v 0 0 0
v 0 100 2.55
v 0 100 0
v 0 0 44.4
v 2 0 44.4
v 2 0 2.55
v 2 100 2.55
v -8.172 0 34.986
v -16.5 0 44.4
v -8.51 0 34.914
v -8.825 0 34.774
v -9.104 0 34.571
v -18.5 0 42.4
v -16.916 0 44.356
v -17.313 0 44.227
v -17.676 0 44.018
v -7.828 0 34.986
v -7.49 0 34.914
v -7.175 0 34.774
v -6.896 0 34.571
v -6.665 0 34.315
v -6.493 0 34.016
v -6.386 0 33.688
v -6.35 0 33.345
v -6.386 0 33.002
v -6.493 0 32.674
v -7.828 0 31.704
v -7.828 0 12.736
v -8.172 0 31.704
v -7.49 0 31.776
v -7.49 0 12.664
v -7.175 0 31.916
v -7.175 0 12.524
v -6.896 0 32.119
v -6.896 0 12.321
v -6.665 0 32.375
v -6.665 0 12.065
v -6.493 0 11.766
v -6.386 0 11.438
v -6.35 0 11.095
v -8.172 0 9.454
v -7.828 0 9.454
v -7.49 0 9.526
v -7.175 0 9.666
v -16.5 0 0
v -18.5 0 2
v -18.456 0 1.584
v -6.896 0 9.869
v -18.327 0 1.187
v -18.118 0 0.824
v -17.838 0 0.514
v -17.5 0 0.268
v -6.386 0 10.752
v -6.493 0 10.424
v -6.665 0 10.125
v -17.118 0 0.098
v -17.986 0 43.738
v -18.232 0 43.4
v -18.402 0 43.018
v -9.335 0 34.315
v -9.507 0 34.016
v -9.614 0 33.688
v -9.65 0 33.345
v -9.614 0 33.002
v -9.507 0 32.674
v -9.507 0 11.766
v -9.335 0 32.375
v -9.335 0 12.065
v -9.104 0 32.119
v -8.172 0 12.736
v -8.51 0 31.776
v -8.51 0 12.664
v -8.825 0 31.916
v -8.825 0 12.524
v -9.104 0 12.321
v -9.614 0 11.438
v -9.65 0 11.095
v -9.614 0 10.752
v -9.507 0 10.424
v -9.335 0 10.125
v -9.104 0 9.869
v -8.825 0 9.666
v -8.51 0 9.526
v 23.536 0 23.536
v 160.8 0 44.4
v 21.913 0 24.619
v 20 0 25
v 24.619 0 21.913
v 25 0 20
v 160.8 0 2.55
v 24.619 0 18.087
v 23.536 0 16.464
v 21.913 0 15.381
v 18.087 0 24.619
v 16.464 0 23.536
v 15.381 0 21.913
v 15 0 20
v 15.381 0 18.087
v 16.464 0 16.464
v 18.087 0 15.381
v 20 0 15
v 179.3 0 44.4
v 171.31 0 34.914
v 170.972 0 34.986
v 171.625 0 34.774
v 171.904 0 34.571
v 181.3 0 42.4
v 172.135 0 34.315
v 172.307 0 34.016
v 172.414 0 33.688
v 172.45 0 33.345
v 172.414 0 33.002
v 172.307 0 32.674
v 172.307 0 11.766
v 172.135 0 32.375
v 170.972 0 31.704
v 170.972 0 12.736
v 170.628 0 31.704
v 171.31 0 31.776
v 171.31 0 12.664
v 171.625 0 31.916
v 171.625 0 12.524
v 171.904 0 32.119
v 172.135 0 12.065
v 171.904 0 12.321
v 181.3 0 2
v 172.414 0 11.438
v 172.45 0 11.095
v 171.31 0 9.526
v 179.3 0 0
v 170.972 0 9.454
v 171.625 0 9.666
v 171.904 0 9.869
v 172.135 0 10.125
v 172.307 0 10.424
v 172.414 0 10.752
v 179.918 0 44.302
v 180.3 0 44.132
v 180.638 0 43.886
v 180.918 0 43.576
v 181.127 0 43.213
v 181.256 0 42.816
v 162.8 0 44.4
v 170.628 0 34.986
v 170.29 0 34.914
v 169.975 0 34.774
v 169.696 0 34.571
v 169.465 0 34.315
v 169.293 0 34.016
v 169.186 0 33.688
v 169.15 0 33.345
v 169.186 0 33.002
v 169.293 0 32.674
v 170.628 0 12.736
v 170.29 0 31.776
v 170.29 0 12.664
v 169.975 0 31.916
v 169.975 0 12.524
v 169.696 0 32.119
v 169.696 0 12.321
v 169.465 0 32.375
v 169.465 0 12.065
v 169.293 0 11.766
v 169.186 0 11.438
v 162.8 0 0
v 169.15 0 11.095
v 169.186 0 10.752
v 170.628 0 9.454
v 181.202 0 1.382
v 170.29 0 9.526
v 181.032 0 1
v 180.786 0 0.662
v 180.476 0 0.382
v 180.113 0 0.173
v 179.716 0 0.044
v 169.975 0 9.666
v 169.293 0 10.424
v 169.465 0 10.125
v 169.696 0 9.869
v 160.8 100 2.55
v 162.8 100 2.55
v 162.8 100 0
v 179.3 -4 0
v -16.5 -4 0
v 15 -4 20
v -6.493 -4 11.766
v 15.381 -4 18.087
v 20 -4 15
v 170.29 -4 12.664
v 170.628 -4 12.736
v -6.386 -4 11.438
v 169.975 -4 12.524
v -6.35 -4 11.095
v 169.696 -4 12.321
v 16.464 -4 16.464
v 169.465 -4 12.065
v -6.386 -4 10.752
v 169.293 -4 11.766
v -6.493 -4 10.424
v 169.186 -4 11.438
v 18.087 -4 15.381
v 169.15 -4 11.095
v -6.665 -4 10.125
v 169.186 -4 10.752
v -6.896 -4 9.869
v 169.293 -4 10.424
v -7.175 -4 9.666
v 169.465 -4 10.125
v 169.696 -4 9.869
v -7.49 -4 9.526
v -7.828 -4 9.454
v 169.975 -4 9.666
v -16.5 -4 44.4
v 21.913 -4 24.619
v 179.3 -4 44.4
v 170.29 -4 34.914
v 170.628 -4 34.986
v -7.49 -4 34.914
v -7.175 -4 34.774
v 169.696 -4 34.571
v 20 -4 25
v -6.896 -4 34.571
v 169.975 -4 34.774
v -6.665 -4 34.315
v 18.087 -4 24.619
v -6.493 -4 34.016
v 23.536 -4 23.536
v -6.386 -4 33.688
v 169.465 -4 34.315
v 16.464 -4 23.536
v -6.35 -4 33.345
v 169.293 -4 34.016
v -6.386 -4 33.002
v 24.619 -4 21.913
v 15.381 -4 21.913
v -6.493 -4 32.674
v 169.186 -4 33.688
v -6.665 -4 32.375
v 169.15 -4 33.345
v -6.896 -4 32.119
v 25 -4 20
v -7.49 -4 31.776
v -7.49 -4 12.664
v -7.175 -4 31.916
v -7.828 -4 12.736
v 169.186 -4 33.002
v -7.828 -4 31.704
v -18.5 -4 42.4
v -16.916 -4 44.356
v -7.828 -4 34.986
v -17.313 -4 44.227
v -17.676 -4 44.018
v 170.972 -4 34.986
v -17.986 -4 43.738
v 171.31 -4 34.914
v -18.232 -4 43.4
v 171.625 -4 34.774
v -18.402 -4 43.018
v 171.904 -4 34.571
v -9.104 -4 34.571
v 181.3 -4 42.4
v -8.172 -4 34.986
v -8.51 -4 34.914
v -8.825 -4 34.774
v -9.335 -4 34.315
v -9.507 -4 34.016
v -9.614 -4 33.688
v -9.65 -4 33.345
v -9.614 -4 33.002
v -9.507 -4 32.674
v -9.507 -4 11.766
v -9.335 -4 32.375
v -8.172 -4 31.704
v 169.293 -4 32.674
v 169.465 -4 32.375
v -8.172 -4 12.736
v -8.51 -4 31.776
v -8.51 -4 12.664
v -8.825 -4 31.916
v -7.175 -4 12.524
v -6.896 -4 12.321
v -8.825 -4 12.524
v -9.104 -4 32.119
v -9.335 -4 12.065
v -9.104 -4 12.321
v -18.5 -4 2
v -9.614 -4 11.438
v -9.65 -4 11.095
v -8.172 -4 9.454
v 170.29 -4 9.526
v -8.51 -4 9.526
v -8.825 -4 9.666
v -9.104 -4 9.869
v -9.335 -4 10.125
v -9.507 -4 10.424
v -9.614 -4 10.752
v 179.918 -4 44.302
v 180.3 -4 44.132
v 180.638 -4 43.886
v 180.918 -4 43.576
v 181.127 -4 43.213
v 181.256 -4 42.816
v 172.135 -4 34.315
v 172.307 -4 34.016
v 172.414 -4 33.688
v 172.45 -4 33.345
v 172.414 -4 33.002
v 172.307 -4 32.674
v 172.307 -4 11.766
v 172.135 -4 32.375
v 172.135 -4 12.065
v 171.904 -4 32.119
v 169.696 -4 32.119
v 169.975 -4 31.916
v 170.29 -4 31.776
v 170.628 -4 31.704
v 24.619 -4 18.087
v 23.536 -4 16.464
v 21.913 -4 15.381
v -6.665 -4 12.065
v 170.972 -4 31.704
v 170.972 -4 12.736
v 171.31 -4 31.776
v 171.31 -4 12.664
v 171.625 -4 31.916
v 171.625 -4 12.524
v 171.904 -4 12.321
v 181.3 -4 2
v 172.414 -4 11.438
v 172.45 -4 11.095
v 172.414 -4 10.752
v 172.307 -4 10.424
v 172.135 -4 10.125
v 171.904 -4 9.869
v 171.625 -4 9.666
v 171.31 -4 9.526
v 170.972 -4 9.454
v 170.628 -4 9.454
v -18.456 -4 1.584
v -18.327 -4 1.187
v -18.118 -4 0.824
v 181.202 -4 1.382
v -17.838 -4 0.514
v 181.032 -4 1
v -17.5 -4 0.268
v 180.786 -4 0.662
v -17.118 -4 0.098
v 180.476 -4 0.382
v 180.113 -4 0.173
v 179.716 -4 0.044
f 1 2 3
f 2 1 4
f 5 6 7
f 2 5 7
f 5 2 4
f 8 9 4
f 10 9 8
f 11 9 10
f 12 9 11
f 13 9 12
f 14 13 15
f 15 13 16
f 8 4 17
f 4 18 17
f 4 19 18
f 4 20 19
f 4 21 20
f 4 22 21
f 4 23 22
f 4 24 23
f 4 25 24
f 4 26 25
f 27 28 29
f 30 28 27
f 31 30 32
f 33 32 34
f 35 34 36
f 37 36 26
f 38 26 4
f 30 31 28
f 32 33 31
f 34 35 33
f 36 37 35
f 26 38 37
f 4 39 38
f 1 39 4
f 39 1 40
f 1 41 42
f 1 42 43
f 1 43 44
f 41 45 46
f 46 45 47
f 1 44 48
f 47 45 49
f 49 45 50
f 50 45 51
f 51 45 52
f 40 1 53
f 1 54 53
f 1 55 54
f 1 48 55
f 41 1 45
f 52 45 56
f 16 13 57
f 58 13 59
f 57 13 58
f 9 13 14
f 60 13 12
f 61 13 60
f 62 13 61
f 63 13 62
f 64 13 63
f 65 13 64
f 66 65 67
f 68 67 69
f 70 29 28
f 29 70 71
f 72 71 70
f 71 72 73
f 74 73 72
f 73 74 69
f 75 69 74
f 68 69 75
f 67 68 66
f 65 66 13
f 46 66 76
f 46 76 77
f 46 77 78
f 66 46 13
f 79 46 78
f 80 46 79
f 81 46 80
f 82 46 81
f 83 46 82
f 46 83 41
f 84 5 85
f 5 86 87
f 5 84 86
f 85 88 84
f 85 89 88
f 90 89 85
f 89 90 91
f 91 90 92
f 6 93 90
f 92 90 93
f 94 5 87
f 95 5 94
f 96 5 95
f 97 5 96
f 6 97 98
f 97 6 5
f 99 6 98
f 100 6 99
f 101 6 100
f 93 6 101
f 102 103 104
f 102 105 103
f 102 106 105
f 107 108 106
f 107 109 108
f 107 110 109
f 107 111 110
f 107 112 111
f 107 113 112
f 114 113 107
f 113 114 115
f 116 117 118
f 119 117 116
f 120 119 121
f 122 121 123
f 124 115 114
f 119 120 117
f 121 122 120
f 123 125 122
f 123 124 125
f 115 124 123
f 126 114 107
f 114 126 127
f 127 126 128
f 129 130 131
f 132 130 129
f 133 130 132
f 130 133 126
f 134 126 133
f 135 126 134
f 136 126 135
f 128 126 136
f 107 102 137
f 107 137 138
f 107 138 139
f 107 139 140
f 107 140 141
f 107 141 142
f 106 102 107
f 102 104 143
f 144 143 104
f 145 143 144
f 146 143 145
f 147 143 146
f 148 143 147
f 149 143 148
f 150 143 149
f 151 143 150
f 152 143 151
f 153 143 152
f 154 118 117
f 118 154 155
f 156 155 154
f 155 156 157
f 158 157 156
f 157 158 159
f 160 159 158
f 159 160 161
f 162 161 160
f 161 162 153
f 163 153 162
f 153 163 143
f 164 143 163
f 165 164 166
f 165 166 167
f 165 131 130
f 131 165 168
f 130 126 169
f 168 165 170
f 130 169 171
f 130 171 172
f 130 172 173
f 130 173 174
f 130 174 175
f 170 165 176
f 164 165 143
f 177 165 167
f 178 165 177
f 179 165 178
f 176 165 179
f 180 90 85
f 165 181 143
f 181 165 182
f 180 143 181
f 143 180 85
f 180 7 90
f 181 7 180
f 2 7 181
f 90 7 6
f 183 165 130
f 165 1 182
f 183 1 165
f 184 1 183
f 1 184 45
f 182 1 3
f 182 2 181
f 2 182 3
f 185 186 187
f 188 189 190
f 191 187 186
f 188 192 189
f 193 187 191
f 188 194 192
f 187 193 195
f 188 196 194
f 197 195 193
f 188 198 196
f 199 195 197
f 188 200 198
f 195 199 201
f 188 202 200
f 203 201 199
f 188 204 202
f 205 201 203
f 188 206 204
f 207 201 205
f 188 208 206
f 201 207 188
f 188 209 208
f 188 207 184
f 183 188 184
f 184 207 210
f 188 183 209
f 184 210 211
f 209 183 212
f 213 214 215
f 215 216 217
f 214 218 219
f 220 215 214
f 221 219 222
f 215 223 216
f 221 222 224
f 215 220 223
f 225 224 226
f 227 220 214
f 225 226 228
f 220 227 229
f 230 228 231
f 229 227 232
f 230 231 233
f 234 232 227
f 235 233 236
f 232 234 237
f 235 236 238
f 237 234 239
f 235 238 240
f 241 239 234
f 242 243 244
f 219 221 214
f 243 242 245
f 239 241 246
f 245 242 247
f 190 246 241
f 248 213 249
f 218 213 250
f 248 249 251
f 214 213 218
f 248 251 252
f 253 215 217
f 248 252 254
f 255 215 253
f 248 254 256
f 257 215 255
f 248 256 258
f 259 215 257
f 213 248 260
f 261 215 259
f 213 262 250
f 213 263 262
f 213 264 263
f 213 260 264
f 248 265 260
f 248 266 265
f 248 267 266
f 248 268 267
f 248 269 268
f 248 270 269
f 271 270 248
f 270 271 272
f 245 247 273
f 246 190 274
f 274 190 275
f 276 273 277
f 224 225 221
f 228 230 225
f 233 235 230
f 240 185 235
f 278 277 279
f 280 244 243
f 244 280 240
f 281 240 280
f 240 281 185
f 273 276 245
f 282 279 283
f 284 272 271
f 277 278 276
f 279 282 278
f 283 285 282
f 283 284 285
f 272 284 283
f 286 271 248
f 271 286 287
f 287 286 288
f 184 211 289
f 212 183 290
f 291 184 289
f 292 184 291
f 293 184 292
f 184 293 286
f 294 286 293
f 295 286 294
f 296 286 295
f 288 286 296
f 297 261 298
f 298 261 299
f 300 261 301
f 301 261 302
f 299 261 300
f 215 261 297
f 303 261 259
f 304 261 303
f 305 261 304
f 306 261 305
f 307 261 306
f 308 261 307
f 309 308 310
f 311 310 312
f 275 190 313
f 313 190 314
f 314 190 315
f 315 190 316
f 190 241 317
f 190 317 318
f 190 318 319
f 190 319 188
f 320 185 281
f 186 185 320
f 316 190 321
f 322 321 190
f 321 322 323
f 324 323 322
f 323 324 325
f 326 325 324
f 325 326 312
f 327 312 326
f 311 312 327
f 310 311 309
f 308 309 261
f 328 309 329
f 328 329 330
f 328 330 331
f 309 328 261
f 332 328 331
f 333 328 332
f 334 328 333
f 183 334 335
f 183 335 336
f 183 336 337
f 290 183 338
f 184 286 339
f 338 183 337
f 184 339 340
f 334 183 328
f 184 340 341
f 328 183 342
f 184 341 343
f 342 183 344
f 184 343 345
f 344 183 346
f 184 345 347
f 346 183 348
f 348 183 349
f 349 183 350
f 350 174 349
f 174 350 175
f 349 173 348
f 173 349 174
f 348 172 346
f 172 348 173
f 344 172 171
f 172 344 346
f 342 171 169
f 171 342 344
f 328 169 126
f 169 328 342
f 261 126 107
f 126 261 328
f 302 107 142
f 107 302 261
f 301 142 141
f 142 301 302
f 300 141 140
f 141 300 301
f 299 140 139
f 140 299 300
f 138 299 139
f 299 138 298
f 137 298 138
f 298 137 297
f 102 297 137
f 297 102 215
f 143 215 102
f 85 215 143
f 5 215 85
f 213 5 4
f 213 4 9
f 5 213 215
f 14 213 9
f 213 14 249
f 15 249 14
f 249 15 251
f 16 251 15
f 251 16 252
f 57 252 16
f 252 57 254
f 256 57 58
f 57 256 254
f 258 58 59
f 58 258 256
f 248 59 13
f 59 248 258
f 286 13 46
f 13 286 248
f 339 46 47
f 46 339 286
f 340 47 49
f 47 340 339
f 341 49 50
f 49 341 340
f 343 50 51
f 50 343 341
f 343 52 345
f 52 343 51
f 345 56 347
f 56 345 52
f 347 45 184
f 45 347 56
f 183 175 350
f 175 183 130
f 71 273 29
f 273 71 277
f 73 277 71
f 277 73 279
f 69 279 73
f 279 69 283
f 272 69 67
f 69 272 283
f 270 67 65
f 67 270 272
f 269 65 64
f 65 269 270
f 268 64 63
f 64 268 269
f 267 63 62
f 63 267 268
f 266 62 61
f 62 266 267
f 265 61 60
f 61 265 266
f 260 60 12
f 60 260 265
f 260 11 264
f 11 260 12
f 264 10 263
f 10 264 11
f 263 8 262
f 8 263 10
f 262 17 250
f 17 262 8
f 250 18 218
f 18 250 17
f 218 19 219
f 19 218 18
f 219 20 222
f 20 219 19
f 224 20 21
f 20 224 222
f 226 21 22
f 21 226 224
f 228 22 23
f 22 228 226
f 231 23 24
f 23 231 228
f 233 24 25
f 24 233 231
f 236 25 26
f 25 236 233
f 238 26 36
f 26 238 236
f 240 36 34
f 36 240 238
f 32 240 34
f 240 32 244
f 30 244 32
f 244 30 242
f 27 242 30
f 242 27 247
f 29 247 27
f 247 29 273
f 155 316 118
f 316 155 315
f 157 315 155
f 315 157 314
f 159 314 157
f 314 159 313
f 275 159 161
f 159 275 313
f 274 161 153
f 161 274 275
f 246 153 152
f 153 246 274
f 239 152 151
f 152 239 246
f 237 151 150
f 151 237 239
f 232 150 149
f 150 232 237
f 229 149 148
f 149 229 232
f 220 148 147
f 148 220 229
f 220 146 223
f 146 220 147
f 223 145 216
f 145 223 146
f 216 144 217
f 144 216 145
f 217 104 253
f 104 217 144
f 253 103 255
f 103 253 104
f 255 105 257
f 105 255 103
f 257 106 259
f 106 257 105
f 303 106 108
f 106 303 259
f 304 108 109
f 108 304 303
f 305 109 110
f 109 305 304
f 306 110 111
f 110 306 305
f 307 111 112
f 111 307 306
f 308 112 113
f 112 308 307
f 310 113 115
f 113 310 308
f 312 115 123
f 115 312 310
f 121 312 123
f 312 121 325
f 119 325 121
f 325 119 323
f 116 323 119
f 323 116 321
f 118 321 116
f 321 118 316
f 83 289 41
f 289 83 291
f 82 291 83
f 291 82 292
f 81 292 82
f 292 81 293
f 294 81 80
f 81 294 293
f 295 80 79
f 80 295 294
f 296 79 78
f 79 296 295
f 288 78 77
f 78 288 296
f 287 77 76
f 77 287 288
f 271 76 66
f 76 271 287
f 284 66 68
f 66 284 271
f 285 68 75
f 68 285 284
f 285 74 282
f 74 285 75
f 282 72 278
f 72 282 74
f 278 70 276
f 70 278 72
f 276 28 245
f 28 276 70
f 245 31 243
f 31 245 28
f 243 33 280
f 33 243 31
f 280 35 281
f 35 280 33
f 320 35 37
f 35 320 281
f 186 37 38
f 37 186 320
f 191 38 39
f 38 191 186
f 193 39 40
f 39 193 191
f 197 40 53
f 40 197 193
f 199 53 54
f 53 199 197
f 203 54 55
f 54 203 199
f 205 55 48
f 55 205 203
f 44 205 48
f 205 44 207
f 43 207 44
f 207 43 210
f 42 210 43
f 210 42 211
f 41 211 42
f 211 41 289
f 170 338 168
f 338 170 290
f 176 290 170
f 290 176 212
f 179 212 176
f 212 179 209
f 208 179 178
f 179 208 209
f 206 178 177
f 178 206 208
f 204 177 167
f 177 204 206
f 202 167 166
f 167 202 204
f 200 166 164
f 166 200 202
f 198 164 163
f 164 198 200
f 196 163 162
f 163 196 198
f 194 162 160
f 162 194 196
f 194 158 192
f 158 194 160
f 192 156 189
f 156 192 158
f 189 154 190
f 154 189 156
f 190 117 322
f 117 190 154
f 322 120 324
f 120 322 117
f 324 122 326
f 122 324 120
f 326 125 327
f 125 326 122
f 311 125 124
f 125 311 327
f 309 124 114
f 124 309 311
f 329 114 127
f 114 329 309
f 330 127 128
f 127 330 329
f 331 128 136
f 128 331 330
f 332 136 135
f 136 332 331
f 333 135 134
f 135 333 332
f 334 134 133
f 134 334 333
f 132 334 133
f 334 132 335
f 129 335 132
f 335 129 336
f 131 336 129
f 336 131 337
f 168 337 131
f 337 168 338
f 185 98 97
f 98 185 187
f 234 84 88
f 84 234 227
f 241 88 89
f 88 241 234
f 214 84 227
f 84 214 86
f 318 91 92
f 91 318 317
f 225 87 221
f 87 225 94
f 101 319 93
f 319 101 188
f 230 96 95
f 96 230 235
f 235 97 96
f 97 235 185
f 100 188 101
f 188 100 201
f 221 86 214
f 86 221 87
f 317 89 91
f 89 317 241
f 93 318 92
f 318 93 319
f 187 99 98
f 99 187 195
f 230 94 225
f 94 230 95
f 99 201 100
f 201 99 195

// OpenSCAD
// file: microlab-2.scad
/* [Hidden] */
ML2_FRAME_THICKNESS = 4;
ML2_FRAME_RADIUS = 2;
ML2_FRAME_HEIGHT = 44.4;
ML2_FRAME_HEIGHT_GAP = 0.10;
ML2_FRAME_SIDE_WIDTH_INSIDE = 18.5;
ML2_FRAME_WIDTH_INSIDE = 162.8;
ML2_FRAME_HOLE_FROM_EDGE = 10.5;
ML2_FRAME_HOLE2_FROM_BOTTOM = 33.345;
ML2_FRAME_HOLE1_FROM_BOTTOM = 11.095;
ML2_FRAME_HOLE_DIA = 3.3;

function HeightFromNumberUnits(numberUnits) =
    numberUnits * ML2_FRAME_HEIGHT + (numberUnits-1) * ML2_FRAME_HEIGHT_GAP;

//FrontPlate(1, showRear=false, openFace=true, valign="left", halign="bottom") {
//    Shelf();
//}

module FrontPlate(numberUnits = 1, showRear=false, openFace=false, valign="bottom", halign="inside-left") {
    totalWidth = ML2_FRAME_WIDTH_INSIDE + 2 * ML2_FRAME_SIDE_WIDTH_INSIDE;
    height = HeightFromNumberUnits(numberUnits);
    
    x = halign == "center" ? totalWidth/2
        : halign == "inside-left" ? ML2_FRAME_SIDE_WIDTH_INSIDE
        : halign == "inside-right" ? totalWidth - ML2_FRAME_SIDE_WIDTH_INSIDE
        : 0;

    z = valign == "top" ? height
        : valign == "middle" ? height/2
        : 0;
    
    translate([-x,0,-z]) {
        rotate([90,0,0]) {
            linear_extrude(ML2_FRAME_THICKNESS)
                difference() {
                    // Front plate
                    if (openFace) {
                        union() {
                            w = ML2_FRAME_SIDE_WIDTH_INSIDE + 2;
                            // Left
                            offset(ML2_FRAME_RADIUS, $fn=30) offset(-ML2_FRAME_RADIUS)
                                square([w, height]);
                            translate([w- ML2_FRAME_RADIUS,0,0]) square([ML2_FRAME_RADIUS, height]);
                            // Right
                            translate([totalWidth - w,0,0]) {
                            offset(ML2_FRAME_RADIUS, $fn=30) offset(-ML2_FRAME_RADIUS)
                                square([w, height]);
                            square([ML2_FRAME_RADIUS, height]);
                            }
                        }
                    } else {
                        offset(ML2_FRAME_RADIUS, $fn=30) offset(-ML2_FRAME_RADIUS)
                            square([totalWidth, height]);
                    }
                    // Fixing holes
                    for (y = [0:numberUnits-1]) translate([0,y * (ML2_FRAME_HEIGHT + ML2_FRAME_HEIGHT_GAP),0]) {
                        translate([ML2_FRAME_HOLE_FROM_EDGE, ML2_FRAME_HOLE1_FROM_BOTTOM]) circle(d=ML2_FRAME_HOLE_DIA, $fn=30);
                        translate([ML2_FRAME_HOLE_FROM_EDGE, ML2_FRAME_HOLE2_FROM_BOTTOM]) circle(d=ML2_FRAME_HOLE_DIA, $fn=30);
                        translate([totalWidth-ML2_FRAME_HOLE_FROM_EDGE, ML2_FRAME_HOLE1_FROM_BOTTOM]) circle(d=ML2_FRAME_HOLE_DIA, $fn=30);
                        translate([totalWidth-ML2_FRAME_HOLE_FROM_EDGE, ML2_FRAME_HOLE2_FROM_BOTTOM]) circle(d=ML2_FRAME_HOLE_DIA, $fn=30);
                    }
                }
        }
        if (showRear) {
            %translate([ML2_FRAME_SIDE_WIDTH_INSIDE,0,0]) cube([ML2_FRAME_WIDTH_INSIDE, 100, height]);
        }
        children();
    }
}

module Shelf(numberUnits = 1, depth=100, shelfThickness=2.55, supportThickness=2) {
    height = HeightFromNumberUnits(numberUnits);
    translate([ML2_FRAME_SIDE_WIDTH_INSIDE,0,0]) {
        translate([0,-ML2_FRAME_THICKNESS,0]) cube([ML2_FRAME_WIDTH_INSIDE, depth + ML2_FRAME_THICKNESS, shelfThickness]);
        for (x = [0, ML2_FRAME_WIDTH_INSIDE - supportThickness]) {
            translate([x,0,0])
                rotate([90,0,90]) linear_extrude(supportThickness) polygon([
                    [0, shelfThickness],
                    [0, height],
                    [depth, shelfThickness],
                ]);
        }
    }
}
// main file
include <microlab-2.scad>

difference() {
    FrontPlate(1) {
        Shelf();
    }
        
    translate([20,0.01,20]) rotate([90,0,0]) cylinder(d=10,h=10);
};
